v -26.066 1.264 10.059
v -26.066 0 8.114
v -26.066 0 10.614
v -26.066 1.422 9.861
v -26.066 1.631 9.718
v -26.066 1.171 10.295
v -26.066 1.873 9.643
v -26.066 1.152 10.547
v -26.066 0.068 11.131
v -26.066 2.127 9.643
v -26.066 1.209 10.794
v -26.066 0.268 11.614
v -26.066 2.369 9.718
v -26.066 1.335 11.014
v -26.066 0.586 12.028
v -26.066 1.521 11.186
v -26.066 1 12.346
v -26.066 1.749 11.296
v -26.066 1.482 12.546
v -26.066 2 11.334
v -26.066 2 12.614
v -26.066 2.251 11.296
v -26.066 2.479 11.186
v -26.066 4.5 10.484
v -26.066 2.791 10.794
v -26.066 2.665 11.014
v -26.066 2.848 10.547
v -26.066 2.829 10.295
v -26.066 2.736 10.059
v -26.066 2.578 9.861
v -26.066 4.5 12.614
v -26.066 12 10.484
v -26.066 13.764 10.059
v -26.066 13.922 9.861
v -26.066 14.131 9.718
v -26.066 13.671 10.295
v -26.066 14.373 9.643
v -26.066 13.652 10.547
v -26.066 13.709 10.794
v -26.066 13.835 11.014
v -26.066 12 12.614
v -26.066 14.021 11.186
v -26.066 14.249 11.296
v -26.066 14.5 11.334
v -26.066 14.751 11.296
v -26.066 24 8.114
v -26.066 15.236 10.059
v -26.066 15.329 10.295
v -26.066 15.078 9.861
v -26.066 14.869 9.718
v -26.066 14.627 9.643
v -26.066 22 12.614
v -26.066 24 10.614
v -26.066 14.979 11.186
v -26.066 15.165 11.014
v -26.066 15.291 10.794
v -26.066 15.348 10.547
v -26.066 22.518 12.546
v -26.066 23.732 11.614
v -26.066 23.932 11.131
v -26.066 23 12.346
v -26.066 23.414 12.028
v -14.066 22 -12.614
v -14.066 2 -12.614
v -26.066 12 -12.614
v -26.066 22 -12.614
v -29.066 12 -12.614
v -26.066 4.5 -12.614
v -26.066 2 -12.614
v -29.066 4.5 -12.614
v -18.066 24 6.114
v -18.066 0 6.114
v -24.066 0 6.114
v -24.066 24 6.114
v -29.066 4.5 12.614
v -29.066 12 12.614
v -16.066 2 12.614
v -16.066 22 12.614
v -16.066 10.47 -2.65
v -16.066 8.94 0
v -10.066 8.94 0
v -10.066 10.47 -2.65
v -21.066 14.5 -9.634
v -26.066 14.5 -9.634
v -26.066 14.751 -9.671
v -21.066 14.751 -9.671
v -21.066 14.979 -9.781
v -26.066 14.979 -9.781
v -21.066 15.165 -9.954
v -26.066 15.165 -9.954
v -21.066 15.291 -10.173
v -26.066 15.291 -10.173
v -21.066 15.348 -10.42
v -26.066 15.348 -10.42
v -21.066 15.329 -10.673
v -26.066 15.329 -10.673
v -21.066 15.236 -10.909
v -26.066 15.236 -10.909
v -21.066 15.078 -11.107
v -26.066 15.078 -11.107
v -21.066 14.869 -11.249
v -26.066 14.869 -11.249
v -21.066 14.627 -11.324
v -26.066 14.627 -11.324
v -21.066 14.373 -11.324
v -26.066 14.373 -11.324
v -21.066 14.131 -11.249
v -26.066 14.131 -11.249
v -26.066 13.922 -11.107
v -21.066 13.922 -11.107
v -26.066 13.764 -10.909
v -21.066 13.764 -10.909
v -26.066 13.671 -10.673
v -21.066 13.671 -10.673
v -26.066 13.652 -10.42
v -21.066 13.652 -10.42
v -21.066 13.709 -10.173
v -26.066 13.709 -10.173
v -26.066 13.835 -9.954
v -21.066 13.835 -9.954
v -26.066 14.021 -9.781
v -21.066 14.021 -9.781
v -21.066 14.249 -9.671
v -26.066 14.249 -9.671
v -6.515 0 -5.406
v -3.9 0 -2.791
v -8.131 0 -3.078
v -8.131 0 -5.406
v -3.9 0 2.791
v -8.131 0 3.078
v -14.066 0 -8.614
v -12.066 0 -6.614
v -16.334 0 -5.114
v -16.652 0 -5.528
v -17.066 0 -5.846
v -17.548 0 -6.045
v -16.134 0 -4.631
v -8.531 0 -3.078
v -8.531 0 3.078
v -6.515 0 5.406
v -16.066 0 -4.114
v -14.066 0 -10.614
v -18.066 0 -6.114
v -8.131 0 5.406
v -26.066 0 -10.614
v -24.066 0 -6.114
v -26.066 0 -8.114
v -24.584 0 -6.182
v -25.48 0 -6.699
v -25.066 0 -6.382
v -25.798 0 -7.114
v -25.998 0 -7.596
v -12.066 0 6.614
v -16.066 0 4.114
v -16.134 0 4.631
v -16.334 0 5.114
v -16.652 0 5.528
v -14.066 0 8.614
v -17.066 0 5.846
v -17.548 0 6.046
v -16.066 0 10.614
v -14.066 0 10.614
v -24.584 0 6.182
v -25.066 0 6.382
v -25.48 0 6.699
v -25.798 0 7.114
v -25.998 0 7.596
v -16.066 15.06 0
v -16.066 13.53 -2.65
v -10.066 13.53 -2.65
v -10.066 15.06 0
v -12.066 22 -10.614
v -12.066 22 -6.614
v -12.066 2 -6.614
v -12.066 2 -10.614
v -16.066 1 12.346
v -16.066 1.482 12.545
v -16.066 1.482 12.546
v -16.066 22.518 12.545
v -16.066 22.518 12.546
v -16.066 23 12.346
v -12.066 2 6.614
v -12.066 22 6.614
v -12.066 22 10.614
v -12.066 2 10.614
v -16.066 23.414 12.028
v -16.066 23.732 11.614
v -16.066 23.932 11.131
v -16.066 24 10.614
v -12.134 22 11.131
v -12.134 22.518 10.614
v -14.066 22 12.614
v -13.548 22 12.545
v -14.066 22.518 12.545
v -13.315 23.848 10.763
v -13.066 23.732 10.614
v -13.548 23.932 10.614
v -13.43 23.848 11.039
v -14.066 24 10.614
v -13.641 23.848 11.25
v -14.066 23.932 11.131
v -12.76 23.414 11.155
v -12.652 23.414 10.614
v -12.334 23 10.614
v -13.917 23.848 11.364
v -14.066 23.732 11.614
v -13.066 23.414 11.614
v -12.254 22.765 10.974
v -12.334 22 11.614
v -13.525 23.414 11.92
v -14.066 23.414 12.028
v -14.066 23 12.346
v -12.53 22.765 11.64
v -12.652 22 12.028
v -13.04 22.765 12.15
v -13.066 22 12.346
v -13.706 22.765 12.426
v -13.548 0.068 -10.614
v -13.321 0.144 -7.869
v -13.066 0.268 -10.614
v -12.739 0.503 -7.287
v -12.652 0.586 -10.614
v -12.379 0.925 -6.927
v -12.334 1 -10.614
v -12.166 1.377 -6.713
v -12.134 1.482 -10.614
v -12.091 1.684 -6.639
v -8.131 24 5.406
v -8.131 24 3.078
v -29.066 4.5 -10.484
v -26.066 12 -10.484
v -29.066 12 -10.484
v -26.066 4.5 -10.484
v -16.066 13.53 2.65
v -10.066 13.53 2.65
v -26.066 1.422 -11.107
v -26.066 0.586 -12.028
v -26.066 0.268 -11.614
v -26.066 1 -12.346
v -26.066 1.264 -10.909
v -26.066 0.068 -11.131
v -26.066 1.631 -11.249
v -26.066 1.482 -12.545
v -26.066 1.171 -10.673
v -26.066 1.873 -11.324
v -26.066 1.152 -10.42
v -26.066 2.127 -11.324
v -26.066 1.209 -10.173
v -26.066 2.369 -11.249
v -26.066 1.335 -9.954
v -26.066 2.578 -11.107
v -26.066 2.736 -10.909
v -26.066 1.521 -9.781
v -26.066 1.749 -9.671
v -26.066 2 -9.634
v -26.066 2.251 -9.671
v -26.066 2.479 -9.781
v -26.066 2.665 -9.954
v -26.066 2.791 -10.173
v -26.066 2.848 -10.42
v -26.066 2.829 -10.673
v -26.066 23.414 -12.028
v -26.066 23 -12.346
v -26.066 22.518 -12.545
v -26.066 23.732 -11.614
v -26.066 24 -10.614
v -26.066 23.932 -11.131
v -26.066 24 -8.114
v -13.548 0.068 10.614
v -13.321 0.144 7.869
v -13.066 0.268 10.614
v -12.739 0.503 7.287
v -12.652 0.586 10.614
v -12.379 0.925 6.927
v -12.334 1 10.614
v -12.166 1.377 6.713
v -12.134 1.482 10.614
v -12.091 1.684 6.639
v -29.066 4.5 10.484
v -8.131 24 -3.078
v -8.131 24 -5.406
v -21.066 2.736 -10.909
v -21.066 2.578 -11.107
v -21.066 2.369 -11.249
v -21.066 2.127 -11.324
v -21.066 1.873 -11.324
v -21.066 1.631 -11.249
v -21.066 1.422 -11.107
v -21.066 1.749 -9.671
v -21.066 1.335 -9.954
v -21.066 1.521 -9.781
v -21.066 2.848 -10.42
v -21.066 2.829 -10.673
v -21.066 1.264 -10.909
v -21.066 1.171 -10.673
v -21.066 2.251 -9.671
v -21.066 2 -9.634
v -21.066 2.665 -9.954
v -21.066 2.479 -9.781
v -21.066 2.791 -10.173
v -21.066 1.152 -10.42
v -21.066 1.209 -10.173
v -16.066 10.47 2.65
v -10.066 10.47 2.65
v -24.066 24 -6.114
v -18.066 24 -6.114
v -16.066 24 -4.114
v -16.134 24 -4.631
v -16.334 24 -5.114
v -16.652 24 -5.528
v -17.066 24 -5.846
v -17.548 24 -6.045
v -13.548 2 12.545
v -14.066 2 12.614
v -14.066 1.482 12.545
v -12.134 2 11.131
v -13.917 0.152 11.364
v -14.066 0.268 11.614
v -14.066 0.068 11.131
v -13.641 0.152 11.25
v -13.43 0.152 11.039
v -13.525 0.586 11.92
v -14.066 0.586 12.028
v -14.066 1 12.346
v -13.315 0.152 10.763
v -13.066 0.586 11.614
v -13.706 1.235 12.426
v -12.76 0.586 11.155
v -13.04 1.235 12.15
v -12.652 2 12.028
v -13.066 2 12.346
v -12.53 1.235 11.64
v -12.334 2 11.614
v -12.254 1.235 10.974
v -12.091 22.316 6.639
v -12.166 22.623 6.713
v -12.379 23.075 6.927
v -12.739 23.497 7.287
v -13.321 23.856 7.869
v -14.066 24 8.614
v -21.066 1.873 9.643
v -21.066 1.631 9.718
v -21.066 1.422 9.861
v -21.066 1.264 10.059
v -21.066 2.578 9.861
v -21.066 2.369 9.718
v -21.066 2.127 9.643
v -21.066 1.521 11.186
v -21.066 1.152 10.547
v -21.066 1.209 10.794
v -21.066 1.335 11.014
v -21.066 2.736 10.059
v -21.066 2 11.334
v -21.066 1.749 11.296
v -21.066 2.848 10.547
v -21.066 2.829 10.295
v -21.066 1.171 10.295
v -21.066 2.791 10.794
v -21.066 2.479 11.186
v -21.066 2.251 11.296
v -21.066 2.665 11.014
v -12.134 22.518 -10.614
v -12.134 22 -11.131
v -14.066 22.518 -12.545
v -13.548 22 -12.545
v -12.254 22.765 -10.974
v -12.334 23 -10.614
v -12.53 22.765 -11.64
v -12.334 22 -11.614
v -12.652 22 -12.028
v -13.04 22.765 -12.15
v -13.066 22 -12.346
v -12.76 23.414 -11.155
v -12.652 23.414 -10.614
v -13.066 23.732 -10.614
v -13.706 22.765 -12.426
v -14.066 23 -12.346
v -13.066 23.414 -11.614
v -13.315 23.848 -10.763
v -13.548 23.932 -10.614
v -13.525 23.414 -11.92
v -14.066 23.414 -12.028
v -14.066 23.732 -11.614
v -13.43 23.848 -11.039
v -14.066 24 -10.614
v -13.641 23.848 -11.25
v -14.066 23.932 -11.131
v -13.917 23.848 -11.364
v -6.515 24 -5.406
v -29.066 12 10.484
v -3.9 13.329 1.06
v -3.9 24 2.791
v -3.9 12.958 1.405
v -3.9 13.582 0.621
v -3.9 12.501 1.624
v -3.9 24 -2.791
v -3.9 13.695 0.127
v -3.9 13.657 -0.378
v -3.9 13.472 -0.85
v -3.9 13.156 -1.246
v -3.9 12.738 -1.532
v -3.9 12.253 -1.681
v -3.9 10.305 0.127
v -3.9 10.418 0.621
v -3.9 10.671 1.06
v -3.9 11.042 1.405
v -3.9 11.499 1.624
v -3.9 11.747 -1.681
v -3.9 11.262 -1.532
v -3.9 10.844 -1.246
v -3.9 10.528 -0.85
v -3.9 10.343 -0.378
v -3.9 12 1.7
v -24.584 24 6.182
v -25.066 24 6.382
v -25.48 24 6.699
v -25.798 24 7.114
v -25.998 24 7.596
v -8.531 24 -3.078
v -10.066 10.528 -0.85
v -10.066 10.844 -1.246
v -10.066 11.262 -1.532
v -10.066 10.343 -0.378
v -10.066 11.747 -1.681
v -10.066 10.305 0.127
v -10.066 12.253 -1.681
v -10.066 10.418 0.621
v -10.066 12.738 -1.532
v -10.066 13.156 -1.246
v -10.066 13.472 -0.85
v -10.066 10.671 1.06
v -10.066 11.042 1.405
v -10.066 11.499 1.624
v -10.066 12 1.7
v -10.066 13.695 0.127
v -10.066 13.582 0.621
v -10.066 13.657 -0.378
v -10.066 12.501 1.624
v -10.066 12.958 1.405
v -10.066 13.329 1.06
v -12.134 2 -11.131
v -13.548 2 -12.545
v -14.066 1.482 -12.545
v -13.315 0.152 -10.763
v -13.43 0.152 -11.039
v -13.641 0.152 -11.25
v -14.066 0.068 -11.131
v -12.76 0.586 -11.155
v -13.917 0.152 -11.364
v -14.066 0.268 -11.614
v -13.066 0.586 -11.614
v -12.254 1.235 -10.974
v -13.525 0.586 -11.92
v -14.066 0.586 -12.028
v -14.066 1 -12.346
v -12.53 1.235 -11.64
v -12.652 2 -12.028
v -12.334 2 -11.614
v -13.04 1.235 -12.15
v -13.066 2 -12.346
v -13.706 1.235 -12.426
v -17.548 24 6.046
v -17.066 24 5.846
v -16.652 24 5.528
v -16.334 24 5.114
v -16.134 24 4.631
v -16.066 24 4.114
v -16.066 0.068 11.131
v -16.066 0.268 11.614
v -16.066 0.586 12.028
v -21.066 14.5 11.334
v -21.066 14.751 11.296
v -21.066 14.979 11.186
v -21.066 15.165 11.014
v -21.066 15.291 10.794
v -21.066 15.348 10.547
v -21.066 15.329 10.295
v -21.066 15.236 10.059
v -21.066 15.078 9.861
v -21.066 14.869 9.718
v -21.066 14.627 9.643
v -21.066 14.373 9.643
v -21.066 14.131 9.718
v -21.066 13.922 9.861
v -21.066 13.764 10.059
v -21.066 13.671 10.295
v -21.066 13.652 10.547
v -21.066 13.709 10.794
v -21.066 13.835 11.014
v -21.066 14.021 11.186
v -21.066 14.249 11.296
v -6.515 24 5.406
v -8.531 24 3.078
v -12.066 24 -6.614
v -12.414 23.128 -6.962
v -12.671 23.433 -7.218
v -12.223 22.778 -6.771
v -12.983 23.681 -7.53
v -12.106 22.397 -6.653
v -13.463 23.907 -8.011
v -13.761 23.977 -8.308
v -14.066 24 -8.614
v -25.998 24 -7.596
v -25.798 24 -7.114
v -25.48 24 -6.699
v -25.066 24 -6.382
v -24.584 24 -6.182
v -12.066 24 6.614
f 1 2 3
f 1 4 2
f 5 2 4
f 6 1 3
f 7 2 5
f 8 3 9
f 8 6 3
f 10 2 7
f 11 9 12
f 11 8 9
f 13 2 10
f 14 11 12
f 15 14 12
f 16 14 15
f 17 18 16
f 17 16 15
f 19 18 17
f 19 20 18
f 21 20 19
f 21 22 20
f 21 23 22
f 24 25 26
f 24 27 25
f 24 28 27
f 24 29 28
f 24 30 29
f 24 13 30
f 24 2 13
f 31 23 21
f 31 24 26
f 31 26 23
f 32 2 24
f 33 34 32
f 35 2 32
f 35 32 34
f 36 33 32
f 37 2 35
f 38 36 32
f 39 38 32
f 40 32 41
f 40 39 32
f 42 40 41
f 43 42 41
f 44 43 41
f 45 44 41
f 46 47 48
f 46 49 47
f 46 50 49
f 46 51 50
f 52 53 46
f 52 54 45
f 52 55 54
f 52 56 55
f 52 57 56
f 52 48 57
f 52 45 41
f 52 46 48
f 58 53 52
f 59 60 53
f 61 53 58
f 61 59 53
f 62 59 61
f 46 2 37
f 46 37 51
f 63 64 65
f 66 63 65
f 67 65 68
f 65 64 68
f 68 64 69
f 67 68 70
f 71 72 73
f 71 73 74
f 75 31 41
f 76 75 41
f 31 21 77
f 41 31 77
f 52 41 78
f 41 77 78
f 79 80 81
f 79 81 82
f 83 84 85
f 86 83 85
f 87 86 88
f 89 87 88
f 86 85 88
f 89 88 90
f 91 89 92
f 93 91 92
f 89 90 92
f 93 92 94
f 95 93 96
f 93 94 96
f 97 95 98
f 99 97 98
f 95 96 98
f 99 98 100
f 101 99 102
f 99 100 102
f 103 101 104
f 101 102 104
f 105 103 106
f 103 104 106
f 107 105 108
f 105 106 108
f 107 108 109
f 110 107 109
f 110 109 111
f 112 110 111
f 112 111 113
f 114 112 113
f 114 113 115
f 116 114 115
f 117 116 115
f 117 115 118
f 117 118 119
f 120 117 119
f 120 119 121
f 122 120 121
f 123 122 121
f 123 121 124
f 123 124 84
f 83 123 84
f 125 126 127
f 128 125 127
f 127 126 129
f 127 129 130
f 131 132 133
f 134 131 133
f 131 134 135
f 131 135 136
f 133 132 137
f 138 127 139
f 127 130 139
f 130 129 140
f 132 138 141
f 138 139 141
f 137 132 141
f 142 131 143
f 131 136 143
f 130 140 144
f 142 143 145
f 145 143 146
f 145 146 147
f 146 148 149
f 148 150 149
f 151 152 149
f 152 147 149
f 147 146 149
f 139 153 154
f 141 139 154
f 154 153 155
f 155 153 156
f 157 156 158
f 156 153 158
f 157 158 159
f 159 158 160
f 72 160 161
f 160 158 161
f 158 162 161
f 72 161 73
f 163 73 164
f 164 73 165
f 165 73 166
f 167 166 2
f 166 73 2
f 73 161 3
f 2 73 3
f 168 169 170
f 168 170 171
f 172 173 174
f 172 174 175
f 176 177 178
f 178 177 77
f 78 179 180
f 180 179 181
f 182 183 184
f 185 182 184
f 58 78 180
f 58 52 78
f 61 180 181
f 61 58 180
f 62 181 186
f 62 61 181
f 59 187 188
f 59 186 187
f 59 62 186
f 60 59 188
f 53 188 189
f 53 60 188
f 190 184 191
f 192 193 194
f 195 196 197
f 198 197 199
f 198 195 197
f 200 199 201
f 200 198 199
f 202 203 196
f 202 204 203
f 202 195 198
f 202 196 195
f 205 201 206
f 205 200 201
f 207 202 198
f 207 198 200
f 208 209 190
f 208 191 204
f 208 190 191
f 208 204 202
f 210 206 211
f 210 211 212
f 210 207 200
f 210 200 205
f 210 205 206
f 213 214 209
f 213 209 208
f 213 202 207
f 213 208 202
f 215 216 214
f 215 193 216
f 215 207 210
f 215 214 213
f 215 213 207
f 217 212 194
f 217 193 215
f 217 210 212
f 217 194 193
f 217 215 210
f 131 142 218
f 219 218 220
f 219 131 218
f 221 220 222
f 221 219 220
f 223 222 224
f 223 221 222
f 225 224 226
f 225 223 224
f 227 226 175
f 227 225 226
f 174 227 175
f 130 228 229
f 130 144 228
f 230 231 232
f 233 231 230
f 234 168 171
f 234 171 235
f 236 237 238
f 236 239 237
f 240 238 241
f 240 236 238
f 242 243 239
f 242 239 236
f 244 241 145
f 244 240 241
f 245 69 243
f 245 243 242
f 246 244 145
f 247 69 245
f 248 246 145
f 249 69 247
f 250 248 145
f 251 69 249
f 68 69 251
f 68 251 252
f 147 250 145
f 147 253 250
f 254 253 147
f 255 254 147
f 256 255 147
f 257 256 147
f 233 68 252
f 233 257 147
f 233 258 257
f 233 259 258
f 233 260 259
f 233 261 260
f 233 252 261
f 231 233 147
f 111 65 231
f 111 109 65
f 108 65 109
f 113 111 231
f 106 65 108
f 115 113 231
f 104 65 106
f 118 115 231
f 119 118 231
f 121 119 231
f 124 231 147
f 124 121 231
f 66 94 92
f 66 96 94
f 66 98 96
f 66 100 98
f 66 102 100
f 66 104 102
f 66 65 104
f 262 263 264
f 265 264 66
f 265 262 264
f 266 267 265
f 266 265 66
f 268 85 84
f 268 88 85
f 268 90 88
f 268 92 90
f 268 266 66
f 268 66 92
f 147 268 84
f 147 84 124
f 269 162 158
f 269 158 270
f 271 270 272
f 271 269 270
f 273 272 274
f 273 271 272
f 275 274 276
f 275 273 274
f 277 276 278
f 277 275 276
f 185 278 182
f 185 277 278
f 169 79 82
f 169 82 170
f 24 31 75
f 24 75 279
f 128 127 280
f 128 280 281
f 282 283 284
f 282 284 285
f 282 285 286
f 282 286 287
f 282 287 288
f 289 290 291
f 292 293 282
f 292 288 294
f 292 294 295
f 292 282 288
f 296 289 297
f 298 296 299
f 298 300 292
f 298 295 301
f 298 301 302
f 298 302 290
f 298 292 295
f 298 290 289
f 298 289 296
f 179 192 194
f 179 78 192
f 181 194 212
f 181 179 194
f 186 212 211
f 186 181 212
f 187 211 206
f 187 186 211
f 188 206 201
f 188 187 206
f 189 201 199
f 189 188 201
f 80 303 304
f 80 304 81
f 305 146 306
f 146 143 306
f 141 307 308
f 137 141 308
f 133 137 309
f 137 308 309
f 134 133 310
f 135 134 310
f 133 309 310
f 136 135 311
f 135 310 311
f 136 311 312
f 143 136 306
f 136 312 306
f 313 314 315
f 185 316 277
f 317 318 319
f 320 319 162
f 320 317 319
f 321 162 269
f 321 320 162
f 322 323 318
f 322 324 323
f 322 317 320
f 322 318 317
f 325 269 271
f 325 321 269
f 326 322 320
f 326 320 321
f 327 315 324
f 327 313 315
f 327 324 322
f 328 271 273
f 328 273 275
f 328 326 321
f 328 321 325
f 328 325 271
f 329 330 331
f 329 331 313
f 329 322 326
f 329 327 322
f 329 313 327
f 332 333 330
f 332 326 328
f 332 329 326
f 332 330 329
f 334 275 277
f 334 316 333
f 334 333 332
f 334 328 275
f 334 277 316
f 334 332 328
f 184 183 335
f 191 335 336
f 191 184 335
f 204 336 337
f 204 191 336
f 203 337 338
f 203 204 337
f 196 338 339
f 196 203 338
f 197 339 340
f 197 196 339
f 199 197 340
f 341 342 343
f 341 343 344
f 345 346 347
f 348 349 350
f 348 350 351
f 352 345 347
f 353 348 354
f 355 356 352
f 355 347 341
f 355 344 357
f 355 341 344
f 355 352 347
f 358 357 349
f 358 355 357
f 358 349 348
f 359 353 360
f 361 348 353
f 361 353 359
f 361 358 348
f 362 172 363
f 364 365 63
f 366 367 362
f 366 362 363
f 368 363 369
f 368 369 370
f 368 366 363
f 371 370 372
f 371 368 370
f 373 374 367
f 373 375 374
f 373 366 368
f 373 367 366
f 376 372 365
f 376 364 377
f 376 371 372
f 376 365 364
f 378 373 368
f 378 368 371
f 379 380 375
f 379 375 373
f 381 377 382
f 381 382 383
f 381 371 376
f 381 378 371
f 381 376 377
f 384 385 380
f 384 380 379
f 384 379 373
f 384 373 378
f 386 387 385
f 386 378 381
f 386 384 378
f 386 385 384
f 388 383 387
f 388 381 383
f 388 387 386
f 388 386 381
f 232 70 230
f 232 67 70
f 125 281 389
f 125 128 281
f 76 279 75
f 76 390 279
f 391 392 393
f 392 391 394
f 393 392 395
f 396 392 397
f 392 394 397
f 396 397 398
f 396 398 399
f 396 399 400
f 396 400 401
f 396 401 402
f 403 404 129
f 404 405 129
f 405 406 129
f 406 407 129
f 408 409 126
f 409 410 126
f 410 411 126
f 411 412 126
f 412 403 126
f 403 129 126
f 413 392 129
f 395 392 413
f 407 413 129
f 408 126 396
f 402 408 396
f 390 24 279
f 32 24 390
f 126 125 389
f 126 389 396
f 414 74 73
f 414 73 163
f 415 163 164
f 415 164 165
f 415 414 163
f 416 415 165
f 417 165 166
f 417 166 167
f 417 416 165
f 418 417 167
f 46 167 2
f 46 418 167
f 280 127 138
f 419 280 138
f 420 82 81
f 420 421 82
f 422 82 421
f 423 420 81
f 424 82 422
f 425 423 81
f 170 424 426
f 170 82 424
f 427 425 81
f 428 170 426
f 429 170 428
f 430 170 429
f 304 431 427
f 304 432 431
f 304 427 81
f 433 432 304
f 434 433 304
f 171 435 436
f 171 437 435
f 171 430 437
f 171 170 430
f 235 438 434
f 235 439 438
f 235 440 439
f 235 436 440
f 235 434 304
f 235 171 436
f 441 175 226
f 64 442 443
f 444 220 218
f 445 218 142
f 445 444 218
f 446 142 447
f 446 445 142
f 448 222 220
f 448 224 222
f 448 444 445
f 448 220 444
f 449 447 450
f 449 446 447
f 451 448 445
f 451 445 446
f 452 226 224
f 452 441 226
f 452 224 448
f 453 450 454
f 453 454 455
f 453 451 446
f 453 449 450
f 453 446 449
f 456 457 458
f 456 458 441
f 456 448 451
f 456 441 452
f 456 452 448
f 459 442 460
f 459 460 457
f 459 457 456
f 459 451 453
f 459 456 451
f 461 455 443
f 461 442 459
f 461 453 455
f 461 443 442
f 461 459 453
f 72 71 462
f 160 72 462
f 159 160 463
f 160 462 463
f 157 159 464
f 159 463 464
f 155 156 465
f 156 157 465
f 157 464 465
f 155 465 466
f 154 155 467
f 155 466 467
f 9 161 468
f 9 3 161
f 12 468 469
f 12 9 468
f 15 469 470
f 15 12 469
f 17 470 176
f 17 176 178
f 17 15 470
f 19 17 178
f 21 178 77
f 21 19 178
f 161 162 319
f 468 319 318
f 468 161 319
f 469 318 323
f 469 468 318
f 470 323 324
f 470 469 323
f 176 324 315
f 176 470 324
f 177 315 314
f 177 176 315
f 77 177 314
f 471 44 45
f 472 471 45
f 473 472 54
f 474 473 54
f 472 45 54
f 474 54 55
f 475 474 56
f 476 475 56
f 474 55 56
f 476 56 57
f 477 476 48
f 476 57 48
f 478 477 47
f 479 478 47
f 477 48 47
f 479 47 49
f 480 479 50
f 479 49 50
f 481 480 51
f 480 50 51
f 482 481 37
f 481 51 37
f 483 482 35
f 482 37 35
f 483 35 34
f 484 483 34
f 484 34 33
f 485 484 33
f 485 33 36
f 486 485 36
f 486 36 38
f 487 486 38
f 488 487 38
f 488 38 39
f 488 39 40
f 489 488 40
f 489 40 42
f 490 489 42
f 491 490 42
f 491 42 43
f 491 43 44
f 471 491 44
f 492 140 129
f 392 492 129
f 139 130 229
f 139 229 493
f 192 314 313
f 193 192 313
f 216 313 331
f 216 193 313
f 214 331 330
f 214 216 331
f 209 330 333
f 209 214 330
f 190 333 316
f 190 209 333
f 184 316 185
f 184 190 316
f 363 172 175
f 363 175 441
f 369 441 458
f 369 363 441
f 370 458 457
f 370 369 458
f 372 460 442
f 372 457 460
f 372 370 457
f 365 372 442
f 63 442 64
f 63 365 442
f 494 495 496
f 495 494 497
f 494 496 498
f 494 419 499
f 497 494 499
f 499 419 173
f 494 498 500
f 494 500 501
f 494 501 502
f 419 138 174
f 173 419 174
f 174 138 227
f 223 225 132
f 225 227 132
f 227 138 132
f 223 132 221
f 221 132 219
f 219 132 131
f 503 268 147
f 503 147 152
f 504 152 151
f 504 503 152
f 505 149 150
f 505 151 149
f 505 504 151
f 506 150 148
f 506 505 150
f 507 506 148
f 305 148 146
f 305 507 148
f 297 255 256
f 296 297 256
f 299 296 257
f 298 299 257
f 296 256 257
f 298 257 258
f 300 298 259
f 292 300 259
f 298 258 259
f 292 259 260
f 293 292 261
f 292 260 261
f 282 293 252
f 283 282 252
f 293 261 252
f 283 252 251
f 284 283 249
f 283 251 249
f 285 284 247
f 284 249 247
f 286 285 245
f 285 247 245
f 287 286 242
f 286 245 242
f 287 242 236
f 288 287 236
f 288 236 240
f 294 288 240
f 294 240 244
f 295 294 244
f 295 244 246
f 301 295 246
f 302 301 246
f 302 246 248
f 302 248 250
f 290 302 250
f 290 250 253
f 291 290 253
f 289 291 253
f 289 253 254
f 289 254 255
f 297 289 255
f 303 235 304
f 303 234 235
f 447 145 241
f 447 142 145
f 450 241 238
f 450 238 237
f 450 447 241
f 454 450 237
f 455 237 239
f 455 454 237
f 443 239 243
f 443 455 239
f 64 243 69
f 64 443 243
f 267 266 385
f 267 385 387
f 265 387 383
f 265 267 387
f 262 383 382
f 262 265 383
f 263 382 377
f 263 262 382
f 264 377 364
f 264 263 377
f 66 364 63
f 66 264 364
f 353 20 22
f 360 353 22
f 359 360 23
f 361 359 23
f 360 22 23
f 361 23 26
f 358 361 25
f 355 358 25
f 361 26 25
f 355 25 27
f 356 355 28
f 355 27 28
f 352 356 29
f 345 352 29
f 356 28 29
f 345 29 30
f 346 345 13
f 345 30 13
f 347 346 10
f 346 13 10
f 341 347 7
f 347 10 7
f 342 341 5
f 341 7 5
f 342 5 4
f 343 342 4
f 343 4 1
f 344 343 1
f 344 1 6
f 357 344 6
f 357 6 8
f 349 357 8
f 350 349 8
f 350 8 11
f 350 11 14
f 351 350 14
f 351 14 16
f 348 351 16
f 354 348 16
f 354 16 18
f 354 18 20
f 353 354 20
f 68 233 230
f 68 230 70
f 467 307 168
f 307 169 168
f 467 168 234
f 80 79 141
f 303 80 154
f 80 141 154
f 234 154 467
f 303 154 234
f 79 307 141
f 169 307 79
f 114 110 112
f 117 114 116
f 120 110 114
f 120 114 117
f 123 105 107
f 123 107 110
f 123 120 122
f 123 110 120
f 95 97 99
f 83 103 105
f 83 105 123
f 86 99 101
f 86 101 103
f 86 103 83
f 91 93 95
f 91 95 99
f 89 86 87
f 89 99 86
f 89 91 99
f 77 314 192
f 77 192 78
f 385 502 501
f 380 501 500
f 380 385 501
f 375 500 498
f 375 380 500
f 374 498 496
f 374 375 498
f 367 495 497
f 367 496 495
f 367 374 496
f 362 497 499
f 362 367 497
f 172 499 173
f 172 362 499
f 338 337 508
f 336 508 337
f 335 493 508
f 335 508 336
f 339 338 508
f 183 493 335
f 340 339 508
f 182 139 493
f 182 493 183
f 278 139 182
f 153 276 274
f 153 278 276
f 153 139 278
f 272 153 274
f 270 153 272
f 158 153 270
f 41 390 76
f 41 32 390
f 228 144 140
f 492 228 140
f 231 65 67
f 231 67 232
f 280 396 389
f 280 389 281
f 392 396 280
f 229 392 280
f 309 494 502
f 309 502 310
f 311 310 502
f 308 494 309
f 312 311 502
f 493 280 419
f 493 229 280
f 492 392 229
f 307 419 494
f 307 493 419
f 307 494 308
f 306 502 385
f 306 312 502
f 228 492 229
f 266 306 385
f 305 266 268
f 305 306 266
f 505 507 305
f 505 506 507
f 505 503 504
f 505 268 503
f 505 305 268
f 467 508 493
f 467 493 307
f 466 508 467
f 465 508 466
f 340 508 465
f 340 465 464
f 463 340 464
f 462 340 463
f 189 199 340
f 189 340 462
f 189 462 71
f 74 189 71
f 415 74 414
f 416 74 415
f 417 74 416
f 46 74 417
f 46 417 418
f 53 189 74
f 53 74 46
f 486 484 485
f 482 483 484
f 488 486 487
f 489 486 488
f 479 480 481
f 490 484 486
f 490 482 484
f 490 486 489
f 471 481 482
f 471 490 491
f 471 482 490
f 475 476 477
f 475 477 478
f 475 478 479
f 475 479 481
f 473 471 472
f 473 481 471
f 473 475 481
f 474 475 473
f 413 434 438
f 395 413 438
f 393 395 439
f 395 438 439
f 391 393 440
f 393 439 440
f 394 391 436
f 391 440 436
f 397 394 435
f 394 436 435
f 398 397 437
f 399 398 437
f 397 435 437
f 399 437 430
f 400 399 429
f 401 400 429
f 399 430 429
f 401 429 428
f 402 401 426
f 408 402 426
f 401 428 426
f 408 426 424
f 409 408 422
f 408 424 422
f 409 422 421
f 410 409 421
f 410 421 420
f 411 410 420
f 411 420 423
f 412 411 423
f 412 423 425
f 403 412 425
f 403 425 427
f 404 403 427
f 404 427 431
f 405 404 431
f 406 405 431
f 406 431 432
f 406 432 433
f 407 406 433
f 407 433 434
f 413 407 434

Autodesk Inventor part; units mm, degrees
ref_plane "YZ Plane" through (0, 0, 0) normal (1, 0, 0) x (0, 1, 0)
ref_plane "XZ Plane" through (0, 0, 0) normal (0, 1, 0) x (-1, 0, 0)
ref_plane "XY Plane" through (0, 0, 0) normal (0, 0, 1) x (1, 0, 0)
sketch "Szkic3" plane through (0, 0, 0) normal (0, 1, 0) x (-1, 0, 0)
  line L0 (3.9, 2.7912) -> (3.9, -2.7912)
  line L1 (6.5152, 5.4063) -> (3.9, 2.7912)
  line L2 (8.1306, 5.4063) -> (6.5152, 5.4063)
  line L3 (8.1306, 5.4063) -> (8.1306, 3.0781)
  line L4 (8.1306, -3.0781) -> (8.1306, -5.4064)
  line L5 (8.1306, -5.4064) -> (6.5152, -5.4064)
  line L6 (6.5152, -5.4064) -> (3.9, -2.7912)
  line L7 (8.1306, 3.0781) -> (8.5306, 3.0781)
  line L8 (8.1306, -3.0781) -> (8.5306, -3.0781)
  line L9 (8.5306, -3.0781) -> (12.0661, -6.6136)
  line L10 (8.5306, 3.0781) -> (12.0661, 6.6136)
  line L11 (12.0661, -6.6136) -> (12.0661, -12.6136)
  line L12 (12.0661, 6.6136) -> (12.0661, 12.6136)
  line L13 (12.0661, 12.6136) -> (16.0661, 12.6136)
  line L14 (12.0661, -12.6136) -> (16.0661, -12.6136)
  line L15 (16.0661, -12.6136) -> (16.0661, 12.6136)
  point P0 (8.1306, 4.2422)
  dimension "d85" = 5.5823
  dimension "d88" = 135
  dimension "d89" = 135
  dimension "d90" = 1.6154
  dimension "d91" = 2.6152
  dimension "d92" = 2.3282
  dimension "d99" = 0.4
  dimension "d100" = 5
  dimension "d101" = 135
  dimension "d102" = 5
  dimension "d103" = 135
  dimension "d114" = 180
  dimension "d115" = 6
  dimension "d116" = 6
  dimension "d117" = 4
  dimension "d118" = 4
extrude "Wyciągnięcie proste1" add sketch "Szkic3" along normal blind 24
sketch "Szkic13" plane through (-16.0661, 0, -12.6136) normal (-1, 0, 0) x (0, 0, 1)
  line L0 (12.6136, 15.06) -> (15.2636, 13.53)
  line L1 (15.2636, 13.53) -> (15.2636, 10.47)
  line L2 (15.2636, 10.47) -> (12.6136, 8.94)
  line L3 (12.6136, 8.94) -> (9.9636, 10.47)
  line L4 (9.9636, 10.47) -> (9.9636, 13.53)
  line L5 (9.9636, 13.53) -> (12.6136, 15.06)
  line L6 (0, 24) -> (25.2273, 24) projected
  line L7 (25.2273, 0) -> (25.2273, 24) projected
  point P0 (12.6136, 0)
  point P1 (12.6136, 12)
  point P2 (12.6136, 24)
  dimension "d119" = 12
  dimension "d120" = 12.6136
  dimension "d121" = 5.3
extrude "Wyciągnięcie proste5" cut sketch "Szkic13" against normal blind 6
sketch "Szkic14" plane through (-10.0661, 0, -12.6136) normal (-1, 0, 0) x (0, 0, 1)
  circle A0 centre (12.6136, 12) radius 1.7
  point P0 (12.6136, 0)
  dimension "d124" = 3.4
extrude "Wyciągnięcie proste6" cut sketch "Szkic14" against normal through all
sketch "Szkic15" plane through (0, 0, 0) normal (0, 0, 1) x (1, 0, 0)
  line L0 (-3.9, 13.7) -> (-3.9, 10.3) projected
  line L1 (-10.0661, 10.3) -> (-10.0661, 13.7) projected
  point P0 (0, 0)
  dimension "d127" = 6.1661
sketch "Szkic16" plane through (-16.0661, 0, -12.6136) normal (-1, 0, 0) x (0, 0, 1)
  point P0 (12.6136, 0)
sketch "Szkic17" plane through (-16.0661, 0, -12.6136) normal (-1, 0, 0) x (0, 0, 1)
  line L0 (25.2273, 0) -> (25.2273, 24) projected
  line L1 (0, 24) -> (25.2273, 24) projected
  line L2 (25.2273, 0) -> (18.7273, 0)
  line L3 (18.7273, 0) -> (18.7273, 24)
  line L4 (18.7273, 24) -> (25.2273, 24)
  line L5 (25.2273, 24) -> (25.2273, 0)
  line L6 (9.5355, 24) -> (6, 24) projected
  line L7 (6.5, 24) -> (0, 24)
  line L8 (0, 24) -> (0, 0)
  line L9 (0, 0) -> (6.5, 0)
  line L10 (6.5, 0) -> (6.5, 24)
  line L11 (0, 0) -> (0, 24) projected
  line L12 (0, 0) -> (25.2273, 0) projected
  point P0 (12.6136, 0)
  dimension "d128" = 6.5
  dimension "d129" = 6.5
extrude "Wyciągnięcie proste7" add sketch "Szkic17" along normal blind 10 contours L2 L3 L1 L0 | L9 L8 L1 L10
sketch "Szkic18" plane through (-26.0661, 0, -12.6136) normal (-1, 0, 0) x (0, 0, 1)
  circle A0 centre (23.0973, 2) radius 0.85
  line L0 (25.2273, 0) -> (25.2273, 24) projected
  line L1 (18.7273, 0) -> (25.2273, 0) projected
  circle A1 centre (2.13, 2) radius 0.85
  line L2 (0, 0) -> (6.5, 0) projected
  line L3 (0, 24) -> (0, 0) projected
  circle A2 centre (23.0973, 14.5) radius 0.85
  circle A3 centre (2.13, 14.5) radius 0.85
  line L4 (2.13, 4.5) -> (0, 4.5)
  line L5 (0, 4.5) -> (0, 12)
  line L6 (0, 12) -> (2.13, 12)
  line L7 (2.13, 12) -> (2.13, 4.5)
  line L8 (25.2273, 0) -> (25.2273, 24) projected
  line L9 (25.2273, 4.5) -> (23.0973, 4.5)
  line L10 (23.0973, 4.5) -> (23.0973, 12)
  line L11 (23.0973, 12) -> (25.2273, 12)
  line L12 (25.2273, 12) -> (25.2273, 4.5)
  point P0 (12.6136, 0)
  point P1 (21.9773, 0)
  point P2 (0, 8.25)
  point P3 (2.13, 8.25)
  point P4 (0, 12)
  point P5 (0, 4.5)
  dimension "d132" = 1.7
  dimension "d133" = 2.13
  dimension "d134" = 2
  dimension "d135" = 2
  dimension "d136" = 2.13
  dimension "d137" = 1.7
  dimension "d138" = 1.7
  dimension "d139" = 12.5
  dimension "d140" = 2.13
  dimension "d141" = 1.7
  dimension "d142" = 2.13
  dimension "d143" = 12.5
  dimension "d144" = 2.5
  dimension "d145" = 2.5
  dimension "d147" = 2.13
  dimension "d148" = 2.5
  dimension "d149" = 2.5
  dimension "d150" = 2.13
extrude "Wyciągnięcie proste8" add sketch "Szkic18" along normal blind 3 contours L9 L10 L11 L0 | L6 L7 L4 L3
extrude "Wyciągnięcie proste9" cut sketch "Szkic18" against normal blind 5 contours A0 | A1 | A2 | A3
fillet "Zaokrąglenie1" radius 2 14 edges at (-16.0661, 12, 6.1136) (-16.0661, 12, -6.1136) (-26.0661, 12, -6.1136) (-26.0661, 12, 6.1136) (-12.0661, 12, 12.6136) (-12.0661, 12, -12.6136) (-19.0661, 0, -12.6136) (-12.0661, 0, -9.6136) (-19.0661, 24, -12.6136) (-12.0661, 24, -9.6136) (-12.0661, 24, 9.6136) (-19.0661, 24, 12.6136) (-12.0661, 0, 9.6136) (-19.0661, 0, 12.6136)
properties part number "Montaż_kamery_Drukowanie 3D"
